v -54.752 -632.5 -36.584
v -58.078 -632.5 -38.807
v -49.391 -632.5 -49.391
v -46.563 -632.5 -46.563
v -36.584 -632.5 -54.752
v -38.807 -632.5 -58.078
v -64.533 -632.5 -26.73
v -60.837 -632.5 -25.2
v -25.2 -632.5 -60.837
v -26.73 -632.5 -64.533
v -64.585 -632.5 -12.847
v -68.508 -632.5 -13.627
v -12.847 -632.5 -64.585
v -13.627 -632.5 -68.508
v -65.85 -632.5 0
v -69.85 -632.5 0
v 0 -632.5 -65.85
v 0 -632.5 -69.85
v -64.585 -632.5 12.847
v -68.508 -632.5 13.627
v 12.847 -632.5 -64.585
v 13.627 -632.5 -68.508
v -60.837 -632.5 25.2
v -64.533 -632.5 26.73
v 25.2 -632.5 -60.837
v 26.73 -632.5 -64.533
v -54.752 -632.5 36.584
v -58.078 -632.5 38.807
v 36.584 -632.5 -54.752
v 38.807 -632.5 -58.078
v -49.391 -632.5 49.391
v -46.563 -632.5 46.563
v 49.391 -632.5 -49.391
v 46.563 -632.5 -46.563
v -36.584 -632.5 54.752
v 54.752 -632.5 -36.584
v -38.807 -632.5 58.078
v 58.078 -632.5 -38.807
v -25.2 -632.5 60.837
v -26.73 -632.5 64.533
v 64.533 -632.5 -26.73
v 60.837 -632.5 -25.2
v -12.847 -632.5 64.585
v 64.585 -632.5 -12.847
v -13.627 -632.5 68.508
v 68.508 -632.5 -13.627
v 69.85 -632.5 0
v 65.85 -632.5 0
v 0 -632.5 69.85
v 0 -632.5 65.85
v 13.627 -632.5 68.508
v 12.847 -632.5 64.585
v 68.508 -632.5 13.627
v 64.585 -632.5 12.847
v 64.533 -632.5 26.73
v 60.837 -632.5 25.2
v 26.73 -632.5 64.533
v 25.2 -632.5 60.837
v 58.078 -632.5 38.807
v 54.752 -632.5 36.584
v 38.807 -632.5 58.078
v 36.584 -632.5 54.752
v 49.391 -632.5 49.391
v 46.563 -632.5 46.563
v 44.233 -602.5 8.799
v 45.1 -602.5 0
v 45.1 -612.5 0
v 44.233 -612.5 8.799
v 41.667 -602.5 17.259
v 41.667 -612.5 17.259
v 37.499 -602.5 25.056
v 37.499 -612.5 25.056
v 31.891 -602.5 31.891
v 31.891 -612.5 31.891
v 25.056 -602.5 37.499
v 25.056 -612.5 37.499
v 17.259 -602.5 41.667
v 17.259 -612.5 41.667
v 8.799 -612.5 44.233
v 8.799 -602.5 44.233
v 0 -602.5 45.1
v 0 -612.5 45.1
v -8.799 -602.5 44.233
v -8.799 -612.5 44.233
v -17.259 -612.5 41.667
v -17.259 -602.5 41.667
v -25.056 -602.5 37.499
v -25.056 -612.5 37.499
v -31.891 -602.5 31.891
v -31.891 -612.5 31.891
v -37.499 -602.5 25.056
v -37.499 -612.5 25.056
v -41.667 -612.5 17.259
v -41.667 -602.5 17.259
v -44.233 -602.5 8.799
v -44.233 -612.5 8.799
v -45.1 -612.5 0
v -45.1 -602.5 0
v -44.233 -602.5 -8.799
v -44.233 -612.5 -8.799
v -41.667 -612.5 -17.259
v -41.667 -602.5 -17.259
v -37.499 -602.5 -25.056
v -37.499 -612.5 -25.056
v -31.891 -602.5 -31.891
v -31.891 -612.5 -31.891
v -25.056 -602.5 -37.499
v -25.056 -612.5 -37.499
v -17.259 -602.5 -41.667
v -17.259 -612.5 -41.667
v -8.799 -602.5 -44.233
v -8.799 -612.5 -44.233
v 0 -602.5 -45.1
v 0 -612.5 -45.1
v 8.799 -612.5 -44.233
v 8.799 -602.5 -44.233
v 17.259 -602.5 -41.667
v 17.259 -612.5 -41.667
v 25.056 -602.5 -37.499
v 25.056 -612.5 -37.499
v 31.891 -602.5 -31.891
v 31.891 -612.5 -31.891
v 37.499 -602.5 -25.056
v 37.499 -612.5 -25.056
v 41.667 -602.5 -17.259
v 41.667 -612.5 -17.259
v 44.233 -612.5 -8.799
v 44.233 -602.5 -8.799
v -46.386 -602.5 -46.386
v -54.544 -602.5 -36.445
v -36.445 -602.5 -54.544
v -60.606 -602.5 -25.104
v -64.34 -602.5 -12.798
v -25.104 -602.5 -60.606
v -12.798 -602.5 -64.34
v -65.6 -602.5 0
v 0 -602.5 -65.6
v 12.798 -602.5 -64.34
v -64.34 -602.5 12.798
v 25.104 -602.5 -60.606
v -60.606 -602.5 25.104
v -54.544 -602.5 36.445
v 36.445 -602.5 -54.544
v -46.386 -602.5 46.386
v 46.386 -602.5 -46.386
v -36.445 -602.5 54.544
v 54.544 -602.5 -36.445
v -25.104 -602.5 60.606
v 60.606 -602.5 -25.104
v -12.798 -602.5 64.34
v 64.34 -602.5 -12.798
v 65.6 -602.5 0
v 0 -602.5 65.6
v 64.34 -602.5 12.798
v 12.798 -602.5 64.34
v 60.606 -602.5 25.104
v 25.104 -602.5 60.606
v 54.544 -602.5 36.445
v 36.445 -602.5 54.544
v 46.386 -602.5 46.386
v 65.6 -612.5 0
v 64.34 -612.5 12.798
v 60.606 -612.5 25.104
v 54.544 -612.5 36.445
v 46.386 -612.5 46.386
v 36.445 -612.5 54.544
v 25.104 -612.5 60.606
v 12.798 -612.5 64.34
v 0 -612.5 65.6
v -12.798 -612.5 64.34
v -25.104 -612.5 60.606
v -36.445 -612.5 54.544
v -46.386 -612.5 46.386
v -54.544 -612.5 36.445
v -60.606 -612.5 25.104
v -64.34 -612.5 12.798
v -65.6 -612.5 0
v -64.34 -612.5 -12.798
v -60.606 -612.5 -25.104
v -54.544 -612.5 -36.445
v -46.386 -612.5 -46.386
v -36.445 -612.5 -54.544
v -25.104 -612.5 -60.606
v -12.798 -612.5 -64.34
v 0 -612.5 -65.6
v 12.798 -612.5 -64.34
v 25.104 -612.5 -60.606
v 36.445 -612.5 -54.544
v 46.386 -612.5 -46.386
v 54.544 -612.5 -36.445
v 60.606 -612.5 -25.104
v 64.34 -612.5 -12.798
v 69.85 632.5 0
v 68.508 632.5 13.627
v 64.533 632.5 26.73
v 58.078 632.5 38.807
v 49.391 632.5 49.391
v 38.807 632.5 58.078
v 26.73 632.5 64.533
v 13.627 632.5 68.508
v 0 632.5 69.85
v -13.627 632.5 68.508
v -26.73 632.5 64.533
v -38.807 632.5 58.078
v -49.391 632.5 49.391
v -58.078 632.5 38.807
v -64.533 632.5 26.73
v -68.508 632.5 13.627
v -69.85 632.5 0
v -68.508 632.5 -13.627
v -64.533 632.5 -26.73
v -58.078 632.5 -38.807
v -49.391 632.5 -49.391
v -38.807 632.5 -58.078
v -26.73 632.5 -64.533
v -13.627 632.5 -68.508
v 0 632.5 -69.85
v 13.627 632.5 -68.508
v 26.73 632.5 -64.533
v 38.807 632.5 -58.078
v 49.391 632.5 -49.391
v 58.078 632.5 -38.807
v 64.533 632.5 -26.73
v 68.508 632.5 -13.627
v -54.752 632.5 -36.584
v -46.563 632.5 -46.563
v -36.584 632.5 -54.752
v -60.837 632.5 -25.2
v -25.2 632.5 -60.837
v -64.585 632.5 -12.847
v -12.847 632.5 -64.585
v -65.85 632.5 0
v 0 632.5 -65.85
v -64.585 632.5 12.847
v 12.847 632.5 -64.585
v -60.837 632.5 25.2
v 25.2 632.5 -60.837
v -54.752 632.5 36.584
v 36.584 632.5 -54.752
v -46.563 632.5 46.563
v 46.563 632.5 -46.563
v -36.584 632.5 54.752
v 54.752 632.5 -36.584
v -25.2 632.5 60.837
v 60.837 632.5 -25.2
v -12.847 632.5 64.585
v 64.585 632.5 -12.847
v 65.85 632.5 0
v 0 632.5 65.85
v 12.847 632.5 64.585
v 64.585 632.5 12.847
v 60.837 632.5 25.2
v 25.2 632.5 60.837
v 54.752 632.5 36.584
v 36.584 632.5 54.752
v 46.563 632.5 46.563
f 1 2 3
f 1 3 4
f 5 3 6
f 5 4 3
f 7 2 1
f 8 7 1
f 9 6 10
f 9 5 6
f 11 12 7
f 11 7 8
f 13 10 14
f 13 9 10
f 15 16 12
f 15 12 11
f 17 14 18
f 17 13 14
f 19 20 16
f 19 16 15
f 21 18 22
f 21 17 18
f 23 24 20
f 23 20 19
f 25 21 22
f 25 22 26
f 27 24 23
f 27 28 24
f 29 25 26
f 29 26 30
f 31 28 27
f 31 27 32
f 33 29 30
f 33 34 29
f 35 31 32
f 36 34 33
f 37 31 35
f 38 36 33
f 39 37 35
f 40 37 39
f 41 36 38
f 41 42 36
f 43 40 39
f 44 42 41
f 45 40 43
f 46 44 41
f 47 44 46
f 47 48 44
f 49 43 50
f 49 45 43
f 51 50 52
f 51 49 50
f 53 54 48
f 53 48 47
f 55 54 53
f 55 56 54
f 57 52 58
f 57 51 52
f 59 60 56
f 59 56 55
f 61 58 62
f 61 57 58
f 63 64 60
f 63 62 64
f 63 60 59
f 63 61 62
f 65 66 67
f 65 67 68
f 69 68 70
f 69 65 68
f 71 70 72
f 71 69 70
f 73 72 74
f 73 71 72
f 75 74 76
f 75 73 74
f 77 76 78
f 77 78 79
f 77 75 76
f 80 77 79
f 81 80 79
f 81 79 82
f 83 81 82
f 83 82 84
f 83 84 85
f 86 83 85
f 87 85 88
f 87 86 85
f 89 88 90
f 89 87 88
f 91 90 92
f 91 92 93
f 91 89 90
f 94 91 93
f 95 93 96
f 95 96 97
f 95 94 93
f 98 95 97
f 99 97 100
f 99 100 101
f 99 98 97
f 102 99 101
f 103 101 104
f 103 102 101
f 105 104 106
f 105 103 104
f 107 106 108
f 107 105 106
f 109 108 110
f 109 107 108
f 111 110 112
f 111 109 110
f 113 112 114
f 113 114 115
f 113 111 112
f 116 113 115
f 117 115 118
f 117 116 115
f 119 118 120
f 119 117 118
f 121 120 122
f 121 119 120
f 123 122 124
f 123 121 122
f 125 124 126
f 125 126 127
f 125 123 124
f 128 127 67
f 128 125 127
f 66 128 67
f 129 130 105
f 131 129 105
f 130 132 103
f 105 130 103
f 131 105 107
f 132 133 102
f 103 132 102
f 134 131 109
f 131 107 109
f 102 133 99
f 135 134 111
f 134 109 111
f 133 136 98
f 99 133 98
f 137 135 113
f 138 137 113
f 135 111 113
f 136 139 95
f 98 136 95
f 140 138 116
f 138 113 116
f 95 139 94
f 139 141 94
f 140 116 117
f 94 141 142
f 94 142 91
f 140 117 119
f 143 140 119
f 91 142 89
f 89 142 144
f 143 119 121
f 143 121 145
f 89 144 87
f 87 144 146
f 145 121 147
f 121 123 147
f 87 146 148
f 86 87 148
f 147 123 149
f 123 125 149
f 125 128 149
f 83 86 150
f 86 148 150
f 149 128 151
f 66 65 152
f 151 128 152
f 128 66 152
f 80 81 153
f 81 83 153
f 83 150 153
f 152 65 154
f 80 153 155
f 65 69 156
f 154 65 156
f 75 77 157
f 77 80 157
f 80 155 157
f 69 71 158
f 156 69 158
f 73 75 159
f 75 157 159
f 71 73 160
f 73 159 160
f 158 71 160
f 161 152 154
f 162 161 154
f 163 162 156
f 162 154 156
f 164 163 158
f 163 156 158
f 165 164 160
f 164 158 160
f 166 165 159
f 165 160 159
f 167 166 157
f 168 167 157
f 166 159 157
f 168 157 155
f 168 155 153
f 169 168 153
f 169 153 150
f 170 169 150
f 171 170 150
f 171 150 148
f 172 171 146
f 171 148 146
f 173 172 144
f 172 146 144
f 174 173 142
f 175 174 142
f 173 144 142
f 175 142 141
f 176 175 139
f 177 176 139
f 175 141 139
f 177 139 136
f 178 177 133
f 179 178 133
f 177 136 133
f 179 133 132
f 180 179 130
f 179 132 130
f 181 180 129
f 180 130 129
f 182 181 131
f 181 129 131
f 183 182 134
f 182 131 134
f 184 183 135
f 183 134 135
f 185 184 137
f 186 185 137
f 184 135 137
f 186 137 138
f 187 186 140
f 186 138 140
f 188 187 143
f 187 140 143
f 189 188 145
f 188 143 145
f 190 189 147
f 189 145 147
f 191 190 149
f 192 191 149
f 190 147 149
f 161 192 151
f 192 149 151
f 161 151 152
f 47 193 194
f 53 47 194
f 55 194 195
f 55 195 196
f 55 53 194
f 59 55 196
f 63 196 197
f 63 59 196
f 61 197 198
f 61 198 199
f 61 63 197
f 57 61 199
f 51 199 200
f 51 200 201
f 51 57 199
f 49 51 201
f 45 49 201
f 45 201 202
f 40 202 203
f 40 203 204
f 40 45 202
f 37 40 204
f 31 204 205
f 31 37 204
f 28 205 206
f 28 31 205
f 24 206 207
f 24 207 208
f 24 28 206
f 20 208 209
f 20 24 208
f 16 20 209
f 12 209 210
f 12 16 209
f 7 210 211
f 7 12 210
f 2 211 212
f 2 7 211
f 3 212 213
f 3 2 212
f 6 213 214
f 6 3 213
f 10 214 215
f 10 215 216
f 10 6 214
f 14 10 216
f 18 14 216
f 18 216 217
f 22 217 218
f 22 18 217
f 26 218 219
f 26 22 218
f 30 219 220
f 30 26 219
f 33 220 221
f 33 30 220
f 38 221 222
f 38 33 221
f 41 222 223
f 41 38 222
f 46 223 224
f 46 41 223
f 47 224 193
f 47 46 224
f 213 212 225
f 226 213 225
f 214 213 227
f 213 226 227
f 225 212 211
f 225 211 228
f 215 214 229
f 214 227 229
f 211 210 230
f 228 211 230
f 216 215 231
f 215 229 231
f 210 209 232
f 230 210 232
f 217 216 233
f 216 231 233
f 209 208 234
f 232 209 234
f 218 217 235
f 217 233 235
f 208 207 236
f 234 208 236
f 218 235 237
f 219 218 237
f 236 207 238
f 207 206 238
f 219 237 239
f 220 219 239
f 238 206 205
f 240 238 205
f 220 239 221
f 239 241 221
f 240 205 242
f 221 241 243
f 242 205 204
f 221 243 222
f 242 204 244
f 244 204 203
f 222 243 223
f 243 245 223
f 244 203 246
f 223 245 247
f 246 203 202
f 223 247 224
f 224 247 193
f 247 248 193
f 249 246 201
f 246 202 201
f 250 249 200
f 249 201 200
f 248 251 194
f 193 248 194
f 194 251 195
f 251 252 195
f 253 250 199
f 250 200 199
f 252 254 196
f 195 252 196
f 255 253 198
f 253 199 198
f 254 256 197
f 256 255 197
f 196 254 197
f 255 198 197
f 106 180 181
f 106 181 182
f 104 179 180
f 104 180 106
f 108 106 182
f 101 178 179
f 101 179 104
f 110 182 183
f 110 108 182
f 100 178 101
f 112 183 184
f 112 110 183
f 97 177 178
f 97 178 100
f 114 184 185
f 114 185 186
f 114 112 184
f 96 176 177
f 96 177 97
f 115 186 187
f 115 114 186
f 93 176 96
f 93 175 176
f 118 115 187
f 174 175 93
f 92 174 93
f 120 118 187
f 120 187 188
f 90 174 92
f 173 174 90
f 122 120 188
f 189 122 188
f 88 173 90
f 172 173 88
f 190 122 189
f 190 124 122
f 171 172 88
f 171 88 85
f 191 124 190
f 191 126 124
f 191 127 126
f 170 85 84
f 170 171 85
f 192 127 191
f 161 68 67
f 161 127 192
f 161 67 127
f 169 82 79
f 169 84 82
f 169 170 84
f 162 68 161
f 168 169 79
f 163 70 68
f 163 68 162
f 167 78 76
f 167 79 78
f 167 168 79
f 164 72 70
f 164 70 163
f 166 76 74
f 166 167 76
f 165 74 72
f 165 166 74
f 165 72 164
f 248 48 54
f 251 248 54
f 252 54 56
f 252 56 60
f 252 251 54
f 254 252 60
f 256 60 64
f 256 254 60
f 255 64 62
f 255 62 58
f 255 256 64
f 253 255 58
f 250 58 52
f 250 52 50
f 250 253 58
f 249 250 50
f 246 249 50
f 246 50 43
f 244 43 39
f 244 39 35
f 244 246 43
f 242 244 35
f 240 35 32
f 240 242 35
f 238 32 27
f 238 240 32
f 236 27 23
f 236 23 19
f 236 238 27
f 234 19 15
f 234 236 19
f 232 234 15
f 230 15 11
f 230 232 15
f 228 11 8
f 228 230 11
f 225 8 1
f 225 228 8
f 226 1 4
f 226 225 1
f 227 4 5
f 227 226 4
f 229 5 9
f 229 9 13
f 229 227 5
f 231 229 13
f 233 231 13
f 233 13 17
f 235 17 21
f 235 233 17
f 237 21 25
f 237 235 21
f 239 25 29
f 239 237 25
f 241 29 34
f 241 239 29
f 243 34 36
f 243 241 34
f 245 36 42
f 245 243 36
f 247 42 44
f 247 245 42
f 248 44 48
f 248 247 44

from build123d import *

# Parameters (mm, degrees)
F1_R     = 69.85
F1_R_2   = 65.85
F2_DEPTH = 632.5
F3_START = 602.5
F1_R_3   = 65.6
F1_R_4   = 45.1
F3_DEPTH = 10


with BuildPart() as f2:
    # F1 (on Front) → F2 (new body, symmetric)
    with BuildSketch(Plane.XZ):
        Circle(F1_R)
        Circle(F1_R_2, mode=Mode.SUBTRACT)
    extrude(amount=F2_DEPTH, both=True)


with BuildPart() as f3:
    # F1 (on Front) → F3 (new body)
    with BuildSketch(Plane.XZ.offset(F3_START)):
        Circle(F1_R_3)
        Circle(F1_R_4, mode=Mode.SUBTRACT)
    extrude(amount=F3_DEPTH)


solid = Compound([f2.part, f3.part])
